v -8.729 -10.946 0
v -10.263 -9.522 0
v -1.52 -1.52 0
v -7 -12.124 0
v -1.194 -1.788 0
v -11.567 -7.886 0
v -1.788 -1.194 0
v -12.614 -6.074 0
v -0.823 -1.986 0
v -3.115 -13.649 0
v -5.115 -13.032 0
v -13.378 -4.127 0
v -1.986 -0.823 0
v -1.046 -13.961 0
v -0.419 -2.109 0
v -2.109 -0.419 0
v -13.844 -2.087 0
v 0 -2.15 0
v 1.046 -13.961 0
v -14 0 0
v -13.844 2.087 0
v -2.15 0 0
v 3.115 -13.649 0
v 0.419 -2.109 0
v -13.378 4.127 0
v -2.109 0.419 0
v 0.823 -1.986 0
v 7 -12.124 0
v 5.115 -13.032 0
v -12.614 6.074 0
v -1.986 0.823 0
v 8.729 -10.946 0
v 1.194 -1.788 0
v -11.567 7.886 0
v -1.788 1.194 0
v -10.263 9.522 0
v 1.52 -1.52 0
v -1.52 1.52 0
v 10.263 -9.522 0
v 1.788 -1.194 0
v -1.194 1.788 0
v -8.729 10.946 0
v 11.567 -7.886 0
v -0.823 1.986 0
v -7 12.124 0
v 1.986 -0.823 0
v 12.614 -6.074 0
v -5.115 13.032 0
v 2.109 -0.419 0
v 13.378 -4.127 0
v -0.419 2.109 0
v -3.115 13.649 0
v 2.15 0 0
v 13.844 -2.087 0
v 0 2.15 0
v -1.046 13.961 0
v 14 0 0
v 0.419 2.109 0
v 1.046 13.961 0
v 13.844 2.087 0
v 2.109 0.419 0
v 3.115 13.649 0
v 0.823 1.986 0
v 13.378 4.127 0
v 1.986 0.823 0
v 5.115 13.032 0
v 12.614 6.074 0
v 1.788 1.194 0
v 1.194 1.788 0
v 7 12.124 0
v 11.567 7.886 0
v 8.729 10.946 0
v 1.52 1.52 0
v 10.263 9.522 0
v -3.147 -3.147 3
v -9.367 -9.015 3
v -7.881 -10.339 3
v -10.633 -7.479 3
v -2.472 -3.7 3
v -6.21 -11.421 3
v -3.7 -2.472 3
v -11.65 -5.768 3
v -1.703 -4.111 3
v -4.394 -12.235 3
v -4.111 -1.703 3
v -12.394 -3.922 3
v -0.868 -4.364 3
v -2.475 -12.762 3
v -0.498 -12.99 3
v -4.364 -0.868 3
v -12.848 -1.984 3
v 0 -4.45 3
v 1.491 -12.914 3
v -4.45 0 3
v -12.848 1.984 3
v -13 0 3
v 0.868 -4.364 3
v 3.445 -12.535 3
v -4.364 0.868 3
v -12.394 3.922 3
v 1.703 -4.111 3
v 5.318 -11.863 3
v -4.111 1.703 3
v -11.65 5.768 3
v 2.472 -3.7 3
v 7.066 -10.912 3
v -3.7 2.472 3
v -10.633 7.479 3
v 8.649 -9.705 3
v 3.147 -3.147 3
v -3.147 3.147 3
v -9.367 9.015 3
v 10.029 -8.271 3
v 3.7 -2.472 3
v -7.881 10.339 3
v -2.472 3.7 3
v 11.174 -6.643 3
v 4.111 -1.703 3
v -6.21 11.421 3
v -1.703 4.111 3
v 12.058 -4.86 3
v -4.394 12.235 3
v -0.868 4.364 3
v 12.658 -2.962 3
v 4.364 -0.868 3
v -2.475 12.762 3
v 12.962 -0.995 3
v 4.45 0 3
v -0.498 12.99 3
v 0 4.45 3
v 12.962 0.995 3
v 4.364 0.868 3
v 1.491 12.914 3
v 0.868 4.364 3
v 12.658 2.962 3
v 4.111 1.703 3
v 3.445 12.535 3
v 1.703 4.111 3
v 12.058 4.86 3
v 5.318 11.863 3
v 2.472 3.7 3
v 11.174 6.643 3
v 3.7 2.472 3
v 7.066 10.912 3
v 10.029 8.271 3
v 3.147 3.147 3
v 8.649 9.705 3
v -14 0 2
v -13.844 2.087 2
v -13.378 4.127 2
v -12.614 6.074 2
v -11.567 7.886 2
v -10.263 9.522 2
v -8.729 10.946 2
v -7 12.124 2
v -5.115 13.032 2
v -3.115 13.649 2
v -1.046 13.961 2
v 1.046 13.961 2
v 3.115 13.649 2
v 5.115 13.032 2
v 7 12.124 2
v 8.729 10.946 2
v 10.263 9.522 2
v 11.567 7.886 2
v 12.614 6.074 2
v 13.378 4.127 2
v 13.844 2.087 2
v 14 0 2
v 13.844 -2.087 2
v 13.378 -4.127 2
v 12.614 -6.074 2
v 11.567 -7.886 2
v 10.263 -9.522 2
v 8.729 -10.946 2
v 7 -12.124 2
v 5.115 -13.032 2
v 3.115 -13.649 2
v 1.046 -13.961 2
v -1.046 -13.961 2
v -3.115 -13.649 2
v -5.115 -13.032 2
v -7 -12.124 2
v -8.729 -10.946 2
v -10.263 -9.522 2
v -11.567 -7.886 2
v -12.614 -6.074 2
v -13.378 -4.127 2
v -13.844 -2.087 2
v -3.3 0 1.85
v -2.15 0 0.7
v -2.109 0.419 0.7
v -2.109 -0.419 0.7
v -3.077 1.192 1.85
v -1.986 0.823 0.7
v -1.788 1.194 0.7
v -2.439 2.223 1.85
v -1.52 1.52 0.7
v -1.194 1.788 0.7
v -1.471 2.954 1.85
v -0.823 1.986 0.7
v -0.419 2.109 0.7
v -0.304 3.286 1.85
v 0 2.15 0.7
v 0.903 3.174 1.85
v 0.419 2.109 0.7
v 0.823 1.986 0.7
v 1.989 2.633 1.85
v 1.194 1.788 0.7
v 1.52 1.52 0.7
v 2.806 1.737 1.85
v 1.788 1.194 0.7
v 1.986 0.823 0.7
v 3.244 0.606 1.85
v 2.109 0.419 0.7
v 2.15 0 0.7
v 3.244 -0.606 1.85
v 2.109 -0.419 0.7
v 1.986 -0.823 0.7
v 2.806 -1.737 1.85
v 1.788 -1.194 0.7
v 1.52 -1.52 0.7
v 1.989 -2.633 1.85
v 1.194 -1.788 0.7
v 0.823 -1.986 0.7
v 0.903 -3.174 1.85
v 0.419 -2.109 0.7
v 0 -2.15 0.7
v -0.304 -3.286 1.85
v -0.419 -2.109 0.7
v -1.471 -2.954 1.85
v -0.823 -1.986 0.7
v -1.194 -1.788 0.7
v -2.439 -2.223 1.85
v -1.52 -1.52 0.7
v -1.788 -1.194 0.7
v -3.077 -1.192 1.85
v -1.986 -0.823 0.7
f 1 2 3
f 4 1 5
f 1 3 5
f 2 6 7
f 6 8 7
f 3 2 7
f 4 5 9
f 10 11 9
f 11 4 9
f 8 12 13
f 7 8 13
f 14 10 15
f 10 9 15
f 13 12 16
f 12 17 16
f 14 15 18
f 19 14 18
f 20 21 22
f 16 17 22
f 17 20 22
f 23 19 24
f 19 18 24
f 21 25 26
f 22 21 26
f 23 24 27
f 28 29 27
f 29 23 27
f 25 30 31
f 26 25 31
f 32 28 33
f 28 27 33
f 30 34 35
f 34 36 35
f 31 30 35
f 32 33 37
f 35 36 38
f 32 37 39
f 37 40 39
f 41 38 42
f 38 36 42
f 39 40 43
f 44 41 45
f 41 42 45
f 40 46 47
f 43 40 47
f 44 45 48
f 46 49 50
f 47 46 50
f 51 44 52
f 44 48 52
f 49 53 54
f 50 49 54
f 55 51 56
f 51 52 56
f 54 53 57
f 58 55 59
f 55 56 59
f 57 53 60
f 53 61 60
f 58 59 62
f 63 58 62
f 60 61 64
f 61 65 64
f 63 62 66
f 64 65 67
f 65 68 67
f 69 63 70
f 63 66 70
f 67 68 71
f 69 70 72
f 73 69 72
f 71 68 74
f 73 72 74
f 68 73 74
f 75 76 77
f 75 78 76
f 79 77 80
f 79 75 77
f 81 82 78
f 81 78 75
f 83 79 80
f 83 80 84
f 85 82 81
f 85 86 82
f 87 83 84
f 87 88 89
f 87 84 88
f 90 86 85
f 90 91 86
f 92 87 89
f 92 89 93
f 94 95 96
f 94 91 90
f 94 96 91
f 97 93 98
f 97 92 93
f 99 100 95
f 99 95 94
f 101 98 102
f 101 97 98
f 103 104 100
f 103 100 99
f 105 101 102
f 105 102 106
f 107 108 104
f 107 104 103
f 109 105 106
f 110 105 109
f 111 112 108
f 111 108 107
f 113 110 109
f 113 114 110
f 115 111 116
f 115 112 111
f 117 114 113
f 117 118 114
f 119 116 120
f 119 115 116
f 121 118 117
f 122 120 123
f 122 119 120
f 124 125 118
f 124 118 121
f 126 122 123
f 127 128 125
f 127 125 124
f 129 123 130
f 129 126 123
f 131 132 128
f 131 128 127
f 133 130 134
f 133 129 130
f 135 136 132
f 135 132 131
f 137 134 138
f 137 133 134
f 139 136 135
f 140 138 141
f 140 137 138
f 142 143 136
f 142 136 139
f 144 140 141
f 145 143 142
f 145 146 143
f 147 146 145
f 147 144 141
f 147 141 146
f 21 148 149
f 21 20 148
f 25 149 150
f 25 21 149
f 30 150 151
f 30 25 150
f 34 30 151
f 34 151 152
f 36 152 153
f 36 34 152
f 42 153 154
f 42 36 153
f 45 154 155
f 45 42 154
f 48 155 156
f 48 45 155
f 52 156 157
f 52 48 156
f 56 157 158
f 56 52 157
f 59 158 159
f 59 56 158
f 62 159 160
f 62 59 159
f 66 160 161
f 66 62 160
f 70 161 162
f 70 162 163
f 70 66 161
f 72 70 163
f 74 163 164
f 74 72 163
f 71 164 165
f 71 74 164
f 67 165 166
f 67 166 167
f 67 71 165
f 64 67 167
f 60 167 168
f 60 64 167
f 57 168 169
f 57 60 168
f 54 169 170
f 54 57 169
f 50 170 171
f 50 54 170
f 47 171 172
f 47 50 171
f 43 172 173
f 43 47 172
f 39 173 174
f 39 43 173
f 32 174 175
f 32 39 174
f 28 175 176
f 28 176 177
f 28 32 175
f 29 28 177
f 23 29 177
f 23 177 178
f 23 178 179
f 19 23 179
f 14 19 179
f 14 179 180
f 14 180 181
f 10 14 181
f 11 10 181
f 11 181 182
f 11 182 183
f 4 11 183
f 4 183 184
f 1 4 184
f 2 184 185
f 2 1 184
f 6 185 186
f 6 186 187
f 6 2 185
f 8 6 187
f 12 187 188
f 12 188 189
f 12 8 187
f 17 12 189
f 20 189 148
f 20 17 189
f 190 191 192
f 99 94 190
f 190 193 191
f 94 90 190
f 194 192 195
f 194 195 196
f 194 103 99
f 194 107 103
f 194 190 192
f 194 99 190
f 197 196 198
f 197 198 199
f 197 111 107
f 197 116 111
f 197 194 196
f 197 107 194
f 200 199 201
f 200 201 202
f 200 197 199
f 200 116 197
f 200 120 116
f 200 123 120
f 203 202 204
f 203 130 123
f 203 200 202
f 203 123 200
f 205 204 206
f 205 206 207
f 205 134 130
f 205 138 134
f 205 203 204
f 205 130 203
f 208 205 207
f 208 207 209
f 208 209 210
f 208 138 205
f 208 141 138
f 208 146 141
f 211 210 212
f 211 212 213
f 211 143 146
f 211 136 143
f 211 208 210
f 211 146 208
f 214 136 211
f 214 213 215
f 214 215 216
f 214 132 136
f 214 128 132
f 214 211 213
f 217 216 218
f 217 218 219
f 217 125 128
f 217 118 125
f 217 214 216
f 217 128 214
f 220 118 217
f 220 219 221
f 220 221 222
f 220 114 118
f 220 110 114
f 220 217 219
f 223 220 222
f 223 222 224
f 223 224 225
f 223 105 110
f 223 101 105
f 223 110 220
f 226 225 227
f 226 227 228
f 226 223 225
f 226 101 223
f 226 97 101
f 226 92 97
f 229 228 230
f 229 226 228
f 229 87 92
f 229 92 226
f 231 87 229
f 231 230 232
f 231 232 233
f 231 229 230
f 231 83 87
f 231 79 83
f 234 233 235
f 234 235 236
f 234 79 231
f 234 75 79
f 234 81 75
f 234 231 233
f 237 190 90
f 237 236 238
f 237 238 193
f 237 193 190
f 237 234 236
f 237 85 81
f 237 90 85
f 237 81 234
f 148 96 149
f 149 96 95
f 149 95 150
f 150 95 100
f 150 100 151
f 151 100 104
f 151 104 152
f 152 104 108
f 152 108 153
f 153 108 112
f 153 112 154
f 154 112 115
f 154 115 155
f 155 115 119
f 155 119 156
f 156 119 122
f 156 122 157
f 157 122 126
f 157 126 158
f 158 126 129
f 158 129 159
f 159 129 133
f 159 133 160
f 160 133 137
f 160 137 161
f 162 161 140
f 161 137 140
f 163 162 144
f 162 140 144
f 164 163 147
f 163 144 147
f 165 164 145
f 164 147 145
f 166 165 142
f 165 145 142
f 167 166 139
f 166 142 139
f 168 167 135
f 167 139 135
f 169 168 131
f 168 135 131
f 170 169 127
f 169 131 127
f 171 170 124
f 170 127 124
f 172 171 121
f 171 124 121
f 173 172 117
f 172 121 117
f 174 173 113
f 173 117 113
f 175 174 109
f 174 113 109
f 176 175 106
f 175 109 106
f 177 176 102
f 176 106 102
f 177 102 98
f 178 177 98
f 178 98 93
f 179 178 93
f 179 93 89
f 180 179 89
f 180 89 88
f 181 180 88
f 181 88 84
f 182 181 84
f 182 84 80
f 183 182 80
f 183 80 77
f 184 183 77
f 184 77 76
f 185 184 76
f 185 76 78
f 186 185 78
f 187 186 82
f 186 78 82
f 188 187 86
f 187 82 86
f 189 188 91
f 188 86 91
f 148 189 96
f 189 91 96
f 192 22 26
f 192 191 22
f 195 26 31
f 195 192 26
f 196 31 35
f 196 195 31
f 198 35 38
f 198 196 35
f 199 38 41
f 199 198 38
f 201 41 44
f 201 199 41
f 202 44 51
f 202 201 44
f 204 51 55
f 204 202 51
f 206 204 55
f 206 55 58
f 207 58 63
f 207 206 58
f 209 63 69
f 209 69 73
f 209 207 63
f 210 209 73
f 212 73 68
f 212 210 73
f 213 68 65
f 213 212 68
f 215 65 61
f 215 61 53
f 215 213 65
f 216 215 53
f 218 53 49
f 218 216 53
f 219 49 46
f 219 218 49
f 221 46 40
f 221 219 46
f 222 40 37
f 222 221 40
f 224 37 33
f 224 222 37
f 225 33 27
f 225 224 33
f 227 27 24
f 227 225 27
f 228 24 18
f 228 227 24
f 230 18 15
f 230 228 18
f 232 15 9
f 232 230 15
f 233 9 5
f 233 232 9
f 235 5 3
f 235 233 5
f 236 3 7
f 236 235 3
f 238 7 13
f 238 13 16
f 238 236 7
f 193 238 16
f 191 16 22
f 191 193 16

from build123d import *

# Parameters (mm, degrees)
SZKIC1_W                    = 14
SZKIC1_H                    = 3
SZKIC4_R                    = 10.5
DODANIE_WYCI_GNI_CIE1_DEPTH = 7


with BuildPart() as part:
    # Szkic1 → Obrót1 (revolve)
    with BuildSketch(Plane(origin=(0, 0, 0), x_dir=(1, 0, 0), z_dir=(0, 1, 0)), mode=Mode.PRIVATE) as obr_t1_sk:
        with Locations((7, -1.5)):
            Rectangle(SZKIC1_W, SZKIC1_H)
    revolve(obr_t1_sk.sketch.rotate(Axis((0, 0, 3), (0, 0, -1)), 180), axis=Axis((0, 0, 3), (0, 0, -1)))

    # Szkic2 → Wycięcie-obrót1 (revolve, cut)
    with BuildSketch(Plane(origin=(0, 0, 0), x_dir=(1, 0, 0), z_dir=(0, 1, 0)), mode=Mode.PRIVATE) as wyci_cie_obr_t1_sk:
        Polygon((13, -3), (14, -3), (14, -2), align=None)
    revolve(wyci_cie_obr_t1_sk.sketch.rotate(Axis((0, 0, 3), (0, 0, -1)), 180), axis=Axis((0, 0, 3), (0, 0, -1)), mode=Mode.SUBTRACT)

    # Szkic3 → Wycięcie-obrót2 (revolve, cut)
    with BuildSketch(Plane(origin=(0, 0, 0), x_dir=(1, 0, 0), z_dir=(0, 1, 0)), mode=Mode.PRIVATE) as wyci_cie_obr_t2_sk:
        Polygon((0, 0), (2.15, 0), (2.15, -0.7), (4.45, -3), (0, -3), align=None)
    revolve(wyci_cie_obr_t2_sk.sketch.rotate(Axis((0, 0, 3), (0, 0, -1)), 180), axis=Axis((0, 0, 3), (0, 0, -1)), mode=Mode.SUBTRACT)


with BuildPart() as body_2:
    # Szkic4 → Dodanie-wyciągnięcie1 (new body)
    with BuildSketch(Plane(origin=(0, 0, 0), x_dir=(0, 0, -1), z_dir=(1, 0, 0))):
        Circle(SZKIC4_R)
    extrude(amount=DODANIE_WYCI_GNI_CIE1_DEPTH)

    # Usuń ścianę1: 1 face struck out; the rest of the skin is kept as a surface, the solid goes
    usu_cian_1_1_drop = [body_2.part.faces().sort_by_distance(Vector(p))[0] for p in ((7, 0, 0),)]
    usu_cian_1_1 = Shell(body_2.part.faces() - usu_cian_1_1_drop)


solid = part.part
